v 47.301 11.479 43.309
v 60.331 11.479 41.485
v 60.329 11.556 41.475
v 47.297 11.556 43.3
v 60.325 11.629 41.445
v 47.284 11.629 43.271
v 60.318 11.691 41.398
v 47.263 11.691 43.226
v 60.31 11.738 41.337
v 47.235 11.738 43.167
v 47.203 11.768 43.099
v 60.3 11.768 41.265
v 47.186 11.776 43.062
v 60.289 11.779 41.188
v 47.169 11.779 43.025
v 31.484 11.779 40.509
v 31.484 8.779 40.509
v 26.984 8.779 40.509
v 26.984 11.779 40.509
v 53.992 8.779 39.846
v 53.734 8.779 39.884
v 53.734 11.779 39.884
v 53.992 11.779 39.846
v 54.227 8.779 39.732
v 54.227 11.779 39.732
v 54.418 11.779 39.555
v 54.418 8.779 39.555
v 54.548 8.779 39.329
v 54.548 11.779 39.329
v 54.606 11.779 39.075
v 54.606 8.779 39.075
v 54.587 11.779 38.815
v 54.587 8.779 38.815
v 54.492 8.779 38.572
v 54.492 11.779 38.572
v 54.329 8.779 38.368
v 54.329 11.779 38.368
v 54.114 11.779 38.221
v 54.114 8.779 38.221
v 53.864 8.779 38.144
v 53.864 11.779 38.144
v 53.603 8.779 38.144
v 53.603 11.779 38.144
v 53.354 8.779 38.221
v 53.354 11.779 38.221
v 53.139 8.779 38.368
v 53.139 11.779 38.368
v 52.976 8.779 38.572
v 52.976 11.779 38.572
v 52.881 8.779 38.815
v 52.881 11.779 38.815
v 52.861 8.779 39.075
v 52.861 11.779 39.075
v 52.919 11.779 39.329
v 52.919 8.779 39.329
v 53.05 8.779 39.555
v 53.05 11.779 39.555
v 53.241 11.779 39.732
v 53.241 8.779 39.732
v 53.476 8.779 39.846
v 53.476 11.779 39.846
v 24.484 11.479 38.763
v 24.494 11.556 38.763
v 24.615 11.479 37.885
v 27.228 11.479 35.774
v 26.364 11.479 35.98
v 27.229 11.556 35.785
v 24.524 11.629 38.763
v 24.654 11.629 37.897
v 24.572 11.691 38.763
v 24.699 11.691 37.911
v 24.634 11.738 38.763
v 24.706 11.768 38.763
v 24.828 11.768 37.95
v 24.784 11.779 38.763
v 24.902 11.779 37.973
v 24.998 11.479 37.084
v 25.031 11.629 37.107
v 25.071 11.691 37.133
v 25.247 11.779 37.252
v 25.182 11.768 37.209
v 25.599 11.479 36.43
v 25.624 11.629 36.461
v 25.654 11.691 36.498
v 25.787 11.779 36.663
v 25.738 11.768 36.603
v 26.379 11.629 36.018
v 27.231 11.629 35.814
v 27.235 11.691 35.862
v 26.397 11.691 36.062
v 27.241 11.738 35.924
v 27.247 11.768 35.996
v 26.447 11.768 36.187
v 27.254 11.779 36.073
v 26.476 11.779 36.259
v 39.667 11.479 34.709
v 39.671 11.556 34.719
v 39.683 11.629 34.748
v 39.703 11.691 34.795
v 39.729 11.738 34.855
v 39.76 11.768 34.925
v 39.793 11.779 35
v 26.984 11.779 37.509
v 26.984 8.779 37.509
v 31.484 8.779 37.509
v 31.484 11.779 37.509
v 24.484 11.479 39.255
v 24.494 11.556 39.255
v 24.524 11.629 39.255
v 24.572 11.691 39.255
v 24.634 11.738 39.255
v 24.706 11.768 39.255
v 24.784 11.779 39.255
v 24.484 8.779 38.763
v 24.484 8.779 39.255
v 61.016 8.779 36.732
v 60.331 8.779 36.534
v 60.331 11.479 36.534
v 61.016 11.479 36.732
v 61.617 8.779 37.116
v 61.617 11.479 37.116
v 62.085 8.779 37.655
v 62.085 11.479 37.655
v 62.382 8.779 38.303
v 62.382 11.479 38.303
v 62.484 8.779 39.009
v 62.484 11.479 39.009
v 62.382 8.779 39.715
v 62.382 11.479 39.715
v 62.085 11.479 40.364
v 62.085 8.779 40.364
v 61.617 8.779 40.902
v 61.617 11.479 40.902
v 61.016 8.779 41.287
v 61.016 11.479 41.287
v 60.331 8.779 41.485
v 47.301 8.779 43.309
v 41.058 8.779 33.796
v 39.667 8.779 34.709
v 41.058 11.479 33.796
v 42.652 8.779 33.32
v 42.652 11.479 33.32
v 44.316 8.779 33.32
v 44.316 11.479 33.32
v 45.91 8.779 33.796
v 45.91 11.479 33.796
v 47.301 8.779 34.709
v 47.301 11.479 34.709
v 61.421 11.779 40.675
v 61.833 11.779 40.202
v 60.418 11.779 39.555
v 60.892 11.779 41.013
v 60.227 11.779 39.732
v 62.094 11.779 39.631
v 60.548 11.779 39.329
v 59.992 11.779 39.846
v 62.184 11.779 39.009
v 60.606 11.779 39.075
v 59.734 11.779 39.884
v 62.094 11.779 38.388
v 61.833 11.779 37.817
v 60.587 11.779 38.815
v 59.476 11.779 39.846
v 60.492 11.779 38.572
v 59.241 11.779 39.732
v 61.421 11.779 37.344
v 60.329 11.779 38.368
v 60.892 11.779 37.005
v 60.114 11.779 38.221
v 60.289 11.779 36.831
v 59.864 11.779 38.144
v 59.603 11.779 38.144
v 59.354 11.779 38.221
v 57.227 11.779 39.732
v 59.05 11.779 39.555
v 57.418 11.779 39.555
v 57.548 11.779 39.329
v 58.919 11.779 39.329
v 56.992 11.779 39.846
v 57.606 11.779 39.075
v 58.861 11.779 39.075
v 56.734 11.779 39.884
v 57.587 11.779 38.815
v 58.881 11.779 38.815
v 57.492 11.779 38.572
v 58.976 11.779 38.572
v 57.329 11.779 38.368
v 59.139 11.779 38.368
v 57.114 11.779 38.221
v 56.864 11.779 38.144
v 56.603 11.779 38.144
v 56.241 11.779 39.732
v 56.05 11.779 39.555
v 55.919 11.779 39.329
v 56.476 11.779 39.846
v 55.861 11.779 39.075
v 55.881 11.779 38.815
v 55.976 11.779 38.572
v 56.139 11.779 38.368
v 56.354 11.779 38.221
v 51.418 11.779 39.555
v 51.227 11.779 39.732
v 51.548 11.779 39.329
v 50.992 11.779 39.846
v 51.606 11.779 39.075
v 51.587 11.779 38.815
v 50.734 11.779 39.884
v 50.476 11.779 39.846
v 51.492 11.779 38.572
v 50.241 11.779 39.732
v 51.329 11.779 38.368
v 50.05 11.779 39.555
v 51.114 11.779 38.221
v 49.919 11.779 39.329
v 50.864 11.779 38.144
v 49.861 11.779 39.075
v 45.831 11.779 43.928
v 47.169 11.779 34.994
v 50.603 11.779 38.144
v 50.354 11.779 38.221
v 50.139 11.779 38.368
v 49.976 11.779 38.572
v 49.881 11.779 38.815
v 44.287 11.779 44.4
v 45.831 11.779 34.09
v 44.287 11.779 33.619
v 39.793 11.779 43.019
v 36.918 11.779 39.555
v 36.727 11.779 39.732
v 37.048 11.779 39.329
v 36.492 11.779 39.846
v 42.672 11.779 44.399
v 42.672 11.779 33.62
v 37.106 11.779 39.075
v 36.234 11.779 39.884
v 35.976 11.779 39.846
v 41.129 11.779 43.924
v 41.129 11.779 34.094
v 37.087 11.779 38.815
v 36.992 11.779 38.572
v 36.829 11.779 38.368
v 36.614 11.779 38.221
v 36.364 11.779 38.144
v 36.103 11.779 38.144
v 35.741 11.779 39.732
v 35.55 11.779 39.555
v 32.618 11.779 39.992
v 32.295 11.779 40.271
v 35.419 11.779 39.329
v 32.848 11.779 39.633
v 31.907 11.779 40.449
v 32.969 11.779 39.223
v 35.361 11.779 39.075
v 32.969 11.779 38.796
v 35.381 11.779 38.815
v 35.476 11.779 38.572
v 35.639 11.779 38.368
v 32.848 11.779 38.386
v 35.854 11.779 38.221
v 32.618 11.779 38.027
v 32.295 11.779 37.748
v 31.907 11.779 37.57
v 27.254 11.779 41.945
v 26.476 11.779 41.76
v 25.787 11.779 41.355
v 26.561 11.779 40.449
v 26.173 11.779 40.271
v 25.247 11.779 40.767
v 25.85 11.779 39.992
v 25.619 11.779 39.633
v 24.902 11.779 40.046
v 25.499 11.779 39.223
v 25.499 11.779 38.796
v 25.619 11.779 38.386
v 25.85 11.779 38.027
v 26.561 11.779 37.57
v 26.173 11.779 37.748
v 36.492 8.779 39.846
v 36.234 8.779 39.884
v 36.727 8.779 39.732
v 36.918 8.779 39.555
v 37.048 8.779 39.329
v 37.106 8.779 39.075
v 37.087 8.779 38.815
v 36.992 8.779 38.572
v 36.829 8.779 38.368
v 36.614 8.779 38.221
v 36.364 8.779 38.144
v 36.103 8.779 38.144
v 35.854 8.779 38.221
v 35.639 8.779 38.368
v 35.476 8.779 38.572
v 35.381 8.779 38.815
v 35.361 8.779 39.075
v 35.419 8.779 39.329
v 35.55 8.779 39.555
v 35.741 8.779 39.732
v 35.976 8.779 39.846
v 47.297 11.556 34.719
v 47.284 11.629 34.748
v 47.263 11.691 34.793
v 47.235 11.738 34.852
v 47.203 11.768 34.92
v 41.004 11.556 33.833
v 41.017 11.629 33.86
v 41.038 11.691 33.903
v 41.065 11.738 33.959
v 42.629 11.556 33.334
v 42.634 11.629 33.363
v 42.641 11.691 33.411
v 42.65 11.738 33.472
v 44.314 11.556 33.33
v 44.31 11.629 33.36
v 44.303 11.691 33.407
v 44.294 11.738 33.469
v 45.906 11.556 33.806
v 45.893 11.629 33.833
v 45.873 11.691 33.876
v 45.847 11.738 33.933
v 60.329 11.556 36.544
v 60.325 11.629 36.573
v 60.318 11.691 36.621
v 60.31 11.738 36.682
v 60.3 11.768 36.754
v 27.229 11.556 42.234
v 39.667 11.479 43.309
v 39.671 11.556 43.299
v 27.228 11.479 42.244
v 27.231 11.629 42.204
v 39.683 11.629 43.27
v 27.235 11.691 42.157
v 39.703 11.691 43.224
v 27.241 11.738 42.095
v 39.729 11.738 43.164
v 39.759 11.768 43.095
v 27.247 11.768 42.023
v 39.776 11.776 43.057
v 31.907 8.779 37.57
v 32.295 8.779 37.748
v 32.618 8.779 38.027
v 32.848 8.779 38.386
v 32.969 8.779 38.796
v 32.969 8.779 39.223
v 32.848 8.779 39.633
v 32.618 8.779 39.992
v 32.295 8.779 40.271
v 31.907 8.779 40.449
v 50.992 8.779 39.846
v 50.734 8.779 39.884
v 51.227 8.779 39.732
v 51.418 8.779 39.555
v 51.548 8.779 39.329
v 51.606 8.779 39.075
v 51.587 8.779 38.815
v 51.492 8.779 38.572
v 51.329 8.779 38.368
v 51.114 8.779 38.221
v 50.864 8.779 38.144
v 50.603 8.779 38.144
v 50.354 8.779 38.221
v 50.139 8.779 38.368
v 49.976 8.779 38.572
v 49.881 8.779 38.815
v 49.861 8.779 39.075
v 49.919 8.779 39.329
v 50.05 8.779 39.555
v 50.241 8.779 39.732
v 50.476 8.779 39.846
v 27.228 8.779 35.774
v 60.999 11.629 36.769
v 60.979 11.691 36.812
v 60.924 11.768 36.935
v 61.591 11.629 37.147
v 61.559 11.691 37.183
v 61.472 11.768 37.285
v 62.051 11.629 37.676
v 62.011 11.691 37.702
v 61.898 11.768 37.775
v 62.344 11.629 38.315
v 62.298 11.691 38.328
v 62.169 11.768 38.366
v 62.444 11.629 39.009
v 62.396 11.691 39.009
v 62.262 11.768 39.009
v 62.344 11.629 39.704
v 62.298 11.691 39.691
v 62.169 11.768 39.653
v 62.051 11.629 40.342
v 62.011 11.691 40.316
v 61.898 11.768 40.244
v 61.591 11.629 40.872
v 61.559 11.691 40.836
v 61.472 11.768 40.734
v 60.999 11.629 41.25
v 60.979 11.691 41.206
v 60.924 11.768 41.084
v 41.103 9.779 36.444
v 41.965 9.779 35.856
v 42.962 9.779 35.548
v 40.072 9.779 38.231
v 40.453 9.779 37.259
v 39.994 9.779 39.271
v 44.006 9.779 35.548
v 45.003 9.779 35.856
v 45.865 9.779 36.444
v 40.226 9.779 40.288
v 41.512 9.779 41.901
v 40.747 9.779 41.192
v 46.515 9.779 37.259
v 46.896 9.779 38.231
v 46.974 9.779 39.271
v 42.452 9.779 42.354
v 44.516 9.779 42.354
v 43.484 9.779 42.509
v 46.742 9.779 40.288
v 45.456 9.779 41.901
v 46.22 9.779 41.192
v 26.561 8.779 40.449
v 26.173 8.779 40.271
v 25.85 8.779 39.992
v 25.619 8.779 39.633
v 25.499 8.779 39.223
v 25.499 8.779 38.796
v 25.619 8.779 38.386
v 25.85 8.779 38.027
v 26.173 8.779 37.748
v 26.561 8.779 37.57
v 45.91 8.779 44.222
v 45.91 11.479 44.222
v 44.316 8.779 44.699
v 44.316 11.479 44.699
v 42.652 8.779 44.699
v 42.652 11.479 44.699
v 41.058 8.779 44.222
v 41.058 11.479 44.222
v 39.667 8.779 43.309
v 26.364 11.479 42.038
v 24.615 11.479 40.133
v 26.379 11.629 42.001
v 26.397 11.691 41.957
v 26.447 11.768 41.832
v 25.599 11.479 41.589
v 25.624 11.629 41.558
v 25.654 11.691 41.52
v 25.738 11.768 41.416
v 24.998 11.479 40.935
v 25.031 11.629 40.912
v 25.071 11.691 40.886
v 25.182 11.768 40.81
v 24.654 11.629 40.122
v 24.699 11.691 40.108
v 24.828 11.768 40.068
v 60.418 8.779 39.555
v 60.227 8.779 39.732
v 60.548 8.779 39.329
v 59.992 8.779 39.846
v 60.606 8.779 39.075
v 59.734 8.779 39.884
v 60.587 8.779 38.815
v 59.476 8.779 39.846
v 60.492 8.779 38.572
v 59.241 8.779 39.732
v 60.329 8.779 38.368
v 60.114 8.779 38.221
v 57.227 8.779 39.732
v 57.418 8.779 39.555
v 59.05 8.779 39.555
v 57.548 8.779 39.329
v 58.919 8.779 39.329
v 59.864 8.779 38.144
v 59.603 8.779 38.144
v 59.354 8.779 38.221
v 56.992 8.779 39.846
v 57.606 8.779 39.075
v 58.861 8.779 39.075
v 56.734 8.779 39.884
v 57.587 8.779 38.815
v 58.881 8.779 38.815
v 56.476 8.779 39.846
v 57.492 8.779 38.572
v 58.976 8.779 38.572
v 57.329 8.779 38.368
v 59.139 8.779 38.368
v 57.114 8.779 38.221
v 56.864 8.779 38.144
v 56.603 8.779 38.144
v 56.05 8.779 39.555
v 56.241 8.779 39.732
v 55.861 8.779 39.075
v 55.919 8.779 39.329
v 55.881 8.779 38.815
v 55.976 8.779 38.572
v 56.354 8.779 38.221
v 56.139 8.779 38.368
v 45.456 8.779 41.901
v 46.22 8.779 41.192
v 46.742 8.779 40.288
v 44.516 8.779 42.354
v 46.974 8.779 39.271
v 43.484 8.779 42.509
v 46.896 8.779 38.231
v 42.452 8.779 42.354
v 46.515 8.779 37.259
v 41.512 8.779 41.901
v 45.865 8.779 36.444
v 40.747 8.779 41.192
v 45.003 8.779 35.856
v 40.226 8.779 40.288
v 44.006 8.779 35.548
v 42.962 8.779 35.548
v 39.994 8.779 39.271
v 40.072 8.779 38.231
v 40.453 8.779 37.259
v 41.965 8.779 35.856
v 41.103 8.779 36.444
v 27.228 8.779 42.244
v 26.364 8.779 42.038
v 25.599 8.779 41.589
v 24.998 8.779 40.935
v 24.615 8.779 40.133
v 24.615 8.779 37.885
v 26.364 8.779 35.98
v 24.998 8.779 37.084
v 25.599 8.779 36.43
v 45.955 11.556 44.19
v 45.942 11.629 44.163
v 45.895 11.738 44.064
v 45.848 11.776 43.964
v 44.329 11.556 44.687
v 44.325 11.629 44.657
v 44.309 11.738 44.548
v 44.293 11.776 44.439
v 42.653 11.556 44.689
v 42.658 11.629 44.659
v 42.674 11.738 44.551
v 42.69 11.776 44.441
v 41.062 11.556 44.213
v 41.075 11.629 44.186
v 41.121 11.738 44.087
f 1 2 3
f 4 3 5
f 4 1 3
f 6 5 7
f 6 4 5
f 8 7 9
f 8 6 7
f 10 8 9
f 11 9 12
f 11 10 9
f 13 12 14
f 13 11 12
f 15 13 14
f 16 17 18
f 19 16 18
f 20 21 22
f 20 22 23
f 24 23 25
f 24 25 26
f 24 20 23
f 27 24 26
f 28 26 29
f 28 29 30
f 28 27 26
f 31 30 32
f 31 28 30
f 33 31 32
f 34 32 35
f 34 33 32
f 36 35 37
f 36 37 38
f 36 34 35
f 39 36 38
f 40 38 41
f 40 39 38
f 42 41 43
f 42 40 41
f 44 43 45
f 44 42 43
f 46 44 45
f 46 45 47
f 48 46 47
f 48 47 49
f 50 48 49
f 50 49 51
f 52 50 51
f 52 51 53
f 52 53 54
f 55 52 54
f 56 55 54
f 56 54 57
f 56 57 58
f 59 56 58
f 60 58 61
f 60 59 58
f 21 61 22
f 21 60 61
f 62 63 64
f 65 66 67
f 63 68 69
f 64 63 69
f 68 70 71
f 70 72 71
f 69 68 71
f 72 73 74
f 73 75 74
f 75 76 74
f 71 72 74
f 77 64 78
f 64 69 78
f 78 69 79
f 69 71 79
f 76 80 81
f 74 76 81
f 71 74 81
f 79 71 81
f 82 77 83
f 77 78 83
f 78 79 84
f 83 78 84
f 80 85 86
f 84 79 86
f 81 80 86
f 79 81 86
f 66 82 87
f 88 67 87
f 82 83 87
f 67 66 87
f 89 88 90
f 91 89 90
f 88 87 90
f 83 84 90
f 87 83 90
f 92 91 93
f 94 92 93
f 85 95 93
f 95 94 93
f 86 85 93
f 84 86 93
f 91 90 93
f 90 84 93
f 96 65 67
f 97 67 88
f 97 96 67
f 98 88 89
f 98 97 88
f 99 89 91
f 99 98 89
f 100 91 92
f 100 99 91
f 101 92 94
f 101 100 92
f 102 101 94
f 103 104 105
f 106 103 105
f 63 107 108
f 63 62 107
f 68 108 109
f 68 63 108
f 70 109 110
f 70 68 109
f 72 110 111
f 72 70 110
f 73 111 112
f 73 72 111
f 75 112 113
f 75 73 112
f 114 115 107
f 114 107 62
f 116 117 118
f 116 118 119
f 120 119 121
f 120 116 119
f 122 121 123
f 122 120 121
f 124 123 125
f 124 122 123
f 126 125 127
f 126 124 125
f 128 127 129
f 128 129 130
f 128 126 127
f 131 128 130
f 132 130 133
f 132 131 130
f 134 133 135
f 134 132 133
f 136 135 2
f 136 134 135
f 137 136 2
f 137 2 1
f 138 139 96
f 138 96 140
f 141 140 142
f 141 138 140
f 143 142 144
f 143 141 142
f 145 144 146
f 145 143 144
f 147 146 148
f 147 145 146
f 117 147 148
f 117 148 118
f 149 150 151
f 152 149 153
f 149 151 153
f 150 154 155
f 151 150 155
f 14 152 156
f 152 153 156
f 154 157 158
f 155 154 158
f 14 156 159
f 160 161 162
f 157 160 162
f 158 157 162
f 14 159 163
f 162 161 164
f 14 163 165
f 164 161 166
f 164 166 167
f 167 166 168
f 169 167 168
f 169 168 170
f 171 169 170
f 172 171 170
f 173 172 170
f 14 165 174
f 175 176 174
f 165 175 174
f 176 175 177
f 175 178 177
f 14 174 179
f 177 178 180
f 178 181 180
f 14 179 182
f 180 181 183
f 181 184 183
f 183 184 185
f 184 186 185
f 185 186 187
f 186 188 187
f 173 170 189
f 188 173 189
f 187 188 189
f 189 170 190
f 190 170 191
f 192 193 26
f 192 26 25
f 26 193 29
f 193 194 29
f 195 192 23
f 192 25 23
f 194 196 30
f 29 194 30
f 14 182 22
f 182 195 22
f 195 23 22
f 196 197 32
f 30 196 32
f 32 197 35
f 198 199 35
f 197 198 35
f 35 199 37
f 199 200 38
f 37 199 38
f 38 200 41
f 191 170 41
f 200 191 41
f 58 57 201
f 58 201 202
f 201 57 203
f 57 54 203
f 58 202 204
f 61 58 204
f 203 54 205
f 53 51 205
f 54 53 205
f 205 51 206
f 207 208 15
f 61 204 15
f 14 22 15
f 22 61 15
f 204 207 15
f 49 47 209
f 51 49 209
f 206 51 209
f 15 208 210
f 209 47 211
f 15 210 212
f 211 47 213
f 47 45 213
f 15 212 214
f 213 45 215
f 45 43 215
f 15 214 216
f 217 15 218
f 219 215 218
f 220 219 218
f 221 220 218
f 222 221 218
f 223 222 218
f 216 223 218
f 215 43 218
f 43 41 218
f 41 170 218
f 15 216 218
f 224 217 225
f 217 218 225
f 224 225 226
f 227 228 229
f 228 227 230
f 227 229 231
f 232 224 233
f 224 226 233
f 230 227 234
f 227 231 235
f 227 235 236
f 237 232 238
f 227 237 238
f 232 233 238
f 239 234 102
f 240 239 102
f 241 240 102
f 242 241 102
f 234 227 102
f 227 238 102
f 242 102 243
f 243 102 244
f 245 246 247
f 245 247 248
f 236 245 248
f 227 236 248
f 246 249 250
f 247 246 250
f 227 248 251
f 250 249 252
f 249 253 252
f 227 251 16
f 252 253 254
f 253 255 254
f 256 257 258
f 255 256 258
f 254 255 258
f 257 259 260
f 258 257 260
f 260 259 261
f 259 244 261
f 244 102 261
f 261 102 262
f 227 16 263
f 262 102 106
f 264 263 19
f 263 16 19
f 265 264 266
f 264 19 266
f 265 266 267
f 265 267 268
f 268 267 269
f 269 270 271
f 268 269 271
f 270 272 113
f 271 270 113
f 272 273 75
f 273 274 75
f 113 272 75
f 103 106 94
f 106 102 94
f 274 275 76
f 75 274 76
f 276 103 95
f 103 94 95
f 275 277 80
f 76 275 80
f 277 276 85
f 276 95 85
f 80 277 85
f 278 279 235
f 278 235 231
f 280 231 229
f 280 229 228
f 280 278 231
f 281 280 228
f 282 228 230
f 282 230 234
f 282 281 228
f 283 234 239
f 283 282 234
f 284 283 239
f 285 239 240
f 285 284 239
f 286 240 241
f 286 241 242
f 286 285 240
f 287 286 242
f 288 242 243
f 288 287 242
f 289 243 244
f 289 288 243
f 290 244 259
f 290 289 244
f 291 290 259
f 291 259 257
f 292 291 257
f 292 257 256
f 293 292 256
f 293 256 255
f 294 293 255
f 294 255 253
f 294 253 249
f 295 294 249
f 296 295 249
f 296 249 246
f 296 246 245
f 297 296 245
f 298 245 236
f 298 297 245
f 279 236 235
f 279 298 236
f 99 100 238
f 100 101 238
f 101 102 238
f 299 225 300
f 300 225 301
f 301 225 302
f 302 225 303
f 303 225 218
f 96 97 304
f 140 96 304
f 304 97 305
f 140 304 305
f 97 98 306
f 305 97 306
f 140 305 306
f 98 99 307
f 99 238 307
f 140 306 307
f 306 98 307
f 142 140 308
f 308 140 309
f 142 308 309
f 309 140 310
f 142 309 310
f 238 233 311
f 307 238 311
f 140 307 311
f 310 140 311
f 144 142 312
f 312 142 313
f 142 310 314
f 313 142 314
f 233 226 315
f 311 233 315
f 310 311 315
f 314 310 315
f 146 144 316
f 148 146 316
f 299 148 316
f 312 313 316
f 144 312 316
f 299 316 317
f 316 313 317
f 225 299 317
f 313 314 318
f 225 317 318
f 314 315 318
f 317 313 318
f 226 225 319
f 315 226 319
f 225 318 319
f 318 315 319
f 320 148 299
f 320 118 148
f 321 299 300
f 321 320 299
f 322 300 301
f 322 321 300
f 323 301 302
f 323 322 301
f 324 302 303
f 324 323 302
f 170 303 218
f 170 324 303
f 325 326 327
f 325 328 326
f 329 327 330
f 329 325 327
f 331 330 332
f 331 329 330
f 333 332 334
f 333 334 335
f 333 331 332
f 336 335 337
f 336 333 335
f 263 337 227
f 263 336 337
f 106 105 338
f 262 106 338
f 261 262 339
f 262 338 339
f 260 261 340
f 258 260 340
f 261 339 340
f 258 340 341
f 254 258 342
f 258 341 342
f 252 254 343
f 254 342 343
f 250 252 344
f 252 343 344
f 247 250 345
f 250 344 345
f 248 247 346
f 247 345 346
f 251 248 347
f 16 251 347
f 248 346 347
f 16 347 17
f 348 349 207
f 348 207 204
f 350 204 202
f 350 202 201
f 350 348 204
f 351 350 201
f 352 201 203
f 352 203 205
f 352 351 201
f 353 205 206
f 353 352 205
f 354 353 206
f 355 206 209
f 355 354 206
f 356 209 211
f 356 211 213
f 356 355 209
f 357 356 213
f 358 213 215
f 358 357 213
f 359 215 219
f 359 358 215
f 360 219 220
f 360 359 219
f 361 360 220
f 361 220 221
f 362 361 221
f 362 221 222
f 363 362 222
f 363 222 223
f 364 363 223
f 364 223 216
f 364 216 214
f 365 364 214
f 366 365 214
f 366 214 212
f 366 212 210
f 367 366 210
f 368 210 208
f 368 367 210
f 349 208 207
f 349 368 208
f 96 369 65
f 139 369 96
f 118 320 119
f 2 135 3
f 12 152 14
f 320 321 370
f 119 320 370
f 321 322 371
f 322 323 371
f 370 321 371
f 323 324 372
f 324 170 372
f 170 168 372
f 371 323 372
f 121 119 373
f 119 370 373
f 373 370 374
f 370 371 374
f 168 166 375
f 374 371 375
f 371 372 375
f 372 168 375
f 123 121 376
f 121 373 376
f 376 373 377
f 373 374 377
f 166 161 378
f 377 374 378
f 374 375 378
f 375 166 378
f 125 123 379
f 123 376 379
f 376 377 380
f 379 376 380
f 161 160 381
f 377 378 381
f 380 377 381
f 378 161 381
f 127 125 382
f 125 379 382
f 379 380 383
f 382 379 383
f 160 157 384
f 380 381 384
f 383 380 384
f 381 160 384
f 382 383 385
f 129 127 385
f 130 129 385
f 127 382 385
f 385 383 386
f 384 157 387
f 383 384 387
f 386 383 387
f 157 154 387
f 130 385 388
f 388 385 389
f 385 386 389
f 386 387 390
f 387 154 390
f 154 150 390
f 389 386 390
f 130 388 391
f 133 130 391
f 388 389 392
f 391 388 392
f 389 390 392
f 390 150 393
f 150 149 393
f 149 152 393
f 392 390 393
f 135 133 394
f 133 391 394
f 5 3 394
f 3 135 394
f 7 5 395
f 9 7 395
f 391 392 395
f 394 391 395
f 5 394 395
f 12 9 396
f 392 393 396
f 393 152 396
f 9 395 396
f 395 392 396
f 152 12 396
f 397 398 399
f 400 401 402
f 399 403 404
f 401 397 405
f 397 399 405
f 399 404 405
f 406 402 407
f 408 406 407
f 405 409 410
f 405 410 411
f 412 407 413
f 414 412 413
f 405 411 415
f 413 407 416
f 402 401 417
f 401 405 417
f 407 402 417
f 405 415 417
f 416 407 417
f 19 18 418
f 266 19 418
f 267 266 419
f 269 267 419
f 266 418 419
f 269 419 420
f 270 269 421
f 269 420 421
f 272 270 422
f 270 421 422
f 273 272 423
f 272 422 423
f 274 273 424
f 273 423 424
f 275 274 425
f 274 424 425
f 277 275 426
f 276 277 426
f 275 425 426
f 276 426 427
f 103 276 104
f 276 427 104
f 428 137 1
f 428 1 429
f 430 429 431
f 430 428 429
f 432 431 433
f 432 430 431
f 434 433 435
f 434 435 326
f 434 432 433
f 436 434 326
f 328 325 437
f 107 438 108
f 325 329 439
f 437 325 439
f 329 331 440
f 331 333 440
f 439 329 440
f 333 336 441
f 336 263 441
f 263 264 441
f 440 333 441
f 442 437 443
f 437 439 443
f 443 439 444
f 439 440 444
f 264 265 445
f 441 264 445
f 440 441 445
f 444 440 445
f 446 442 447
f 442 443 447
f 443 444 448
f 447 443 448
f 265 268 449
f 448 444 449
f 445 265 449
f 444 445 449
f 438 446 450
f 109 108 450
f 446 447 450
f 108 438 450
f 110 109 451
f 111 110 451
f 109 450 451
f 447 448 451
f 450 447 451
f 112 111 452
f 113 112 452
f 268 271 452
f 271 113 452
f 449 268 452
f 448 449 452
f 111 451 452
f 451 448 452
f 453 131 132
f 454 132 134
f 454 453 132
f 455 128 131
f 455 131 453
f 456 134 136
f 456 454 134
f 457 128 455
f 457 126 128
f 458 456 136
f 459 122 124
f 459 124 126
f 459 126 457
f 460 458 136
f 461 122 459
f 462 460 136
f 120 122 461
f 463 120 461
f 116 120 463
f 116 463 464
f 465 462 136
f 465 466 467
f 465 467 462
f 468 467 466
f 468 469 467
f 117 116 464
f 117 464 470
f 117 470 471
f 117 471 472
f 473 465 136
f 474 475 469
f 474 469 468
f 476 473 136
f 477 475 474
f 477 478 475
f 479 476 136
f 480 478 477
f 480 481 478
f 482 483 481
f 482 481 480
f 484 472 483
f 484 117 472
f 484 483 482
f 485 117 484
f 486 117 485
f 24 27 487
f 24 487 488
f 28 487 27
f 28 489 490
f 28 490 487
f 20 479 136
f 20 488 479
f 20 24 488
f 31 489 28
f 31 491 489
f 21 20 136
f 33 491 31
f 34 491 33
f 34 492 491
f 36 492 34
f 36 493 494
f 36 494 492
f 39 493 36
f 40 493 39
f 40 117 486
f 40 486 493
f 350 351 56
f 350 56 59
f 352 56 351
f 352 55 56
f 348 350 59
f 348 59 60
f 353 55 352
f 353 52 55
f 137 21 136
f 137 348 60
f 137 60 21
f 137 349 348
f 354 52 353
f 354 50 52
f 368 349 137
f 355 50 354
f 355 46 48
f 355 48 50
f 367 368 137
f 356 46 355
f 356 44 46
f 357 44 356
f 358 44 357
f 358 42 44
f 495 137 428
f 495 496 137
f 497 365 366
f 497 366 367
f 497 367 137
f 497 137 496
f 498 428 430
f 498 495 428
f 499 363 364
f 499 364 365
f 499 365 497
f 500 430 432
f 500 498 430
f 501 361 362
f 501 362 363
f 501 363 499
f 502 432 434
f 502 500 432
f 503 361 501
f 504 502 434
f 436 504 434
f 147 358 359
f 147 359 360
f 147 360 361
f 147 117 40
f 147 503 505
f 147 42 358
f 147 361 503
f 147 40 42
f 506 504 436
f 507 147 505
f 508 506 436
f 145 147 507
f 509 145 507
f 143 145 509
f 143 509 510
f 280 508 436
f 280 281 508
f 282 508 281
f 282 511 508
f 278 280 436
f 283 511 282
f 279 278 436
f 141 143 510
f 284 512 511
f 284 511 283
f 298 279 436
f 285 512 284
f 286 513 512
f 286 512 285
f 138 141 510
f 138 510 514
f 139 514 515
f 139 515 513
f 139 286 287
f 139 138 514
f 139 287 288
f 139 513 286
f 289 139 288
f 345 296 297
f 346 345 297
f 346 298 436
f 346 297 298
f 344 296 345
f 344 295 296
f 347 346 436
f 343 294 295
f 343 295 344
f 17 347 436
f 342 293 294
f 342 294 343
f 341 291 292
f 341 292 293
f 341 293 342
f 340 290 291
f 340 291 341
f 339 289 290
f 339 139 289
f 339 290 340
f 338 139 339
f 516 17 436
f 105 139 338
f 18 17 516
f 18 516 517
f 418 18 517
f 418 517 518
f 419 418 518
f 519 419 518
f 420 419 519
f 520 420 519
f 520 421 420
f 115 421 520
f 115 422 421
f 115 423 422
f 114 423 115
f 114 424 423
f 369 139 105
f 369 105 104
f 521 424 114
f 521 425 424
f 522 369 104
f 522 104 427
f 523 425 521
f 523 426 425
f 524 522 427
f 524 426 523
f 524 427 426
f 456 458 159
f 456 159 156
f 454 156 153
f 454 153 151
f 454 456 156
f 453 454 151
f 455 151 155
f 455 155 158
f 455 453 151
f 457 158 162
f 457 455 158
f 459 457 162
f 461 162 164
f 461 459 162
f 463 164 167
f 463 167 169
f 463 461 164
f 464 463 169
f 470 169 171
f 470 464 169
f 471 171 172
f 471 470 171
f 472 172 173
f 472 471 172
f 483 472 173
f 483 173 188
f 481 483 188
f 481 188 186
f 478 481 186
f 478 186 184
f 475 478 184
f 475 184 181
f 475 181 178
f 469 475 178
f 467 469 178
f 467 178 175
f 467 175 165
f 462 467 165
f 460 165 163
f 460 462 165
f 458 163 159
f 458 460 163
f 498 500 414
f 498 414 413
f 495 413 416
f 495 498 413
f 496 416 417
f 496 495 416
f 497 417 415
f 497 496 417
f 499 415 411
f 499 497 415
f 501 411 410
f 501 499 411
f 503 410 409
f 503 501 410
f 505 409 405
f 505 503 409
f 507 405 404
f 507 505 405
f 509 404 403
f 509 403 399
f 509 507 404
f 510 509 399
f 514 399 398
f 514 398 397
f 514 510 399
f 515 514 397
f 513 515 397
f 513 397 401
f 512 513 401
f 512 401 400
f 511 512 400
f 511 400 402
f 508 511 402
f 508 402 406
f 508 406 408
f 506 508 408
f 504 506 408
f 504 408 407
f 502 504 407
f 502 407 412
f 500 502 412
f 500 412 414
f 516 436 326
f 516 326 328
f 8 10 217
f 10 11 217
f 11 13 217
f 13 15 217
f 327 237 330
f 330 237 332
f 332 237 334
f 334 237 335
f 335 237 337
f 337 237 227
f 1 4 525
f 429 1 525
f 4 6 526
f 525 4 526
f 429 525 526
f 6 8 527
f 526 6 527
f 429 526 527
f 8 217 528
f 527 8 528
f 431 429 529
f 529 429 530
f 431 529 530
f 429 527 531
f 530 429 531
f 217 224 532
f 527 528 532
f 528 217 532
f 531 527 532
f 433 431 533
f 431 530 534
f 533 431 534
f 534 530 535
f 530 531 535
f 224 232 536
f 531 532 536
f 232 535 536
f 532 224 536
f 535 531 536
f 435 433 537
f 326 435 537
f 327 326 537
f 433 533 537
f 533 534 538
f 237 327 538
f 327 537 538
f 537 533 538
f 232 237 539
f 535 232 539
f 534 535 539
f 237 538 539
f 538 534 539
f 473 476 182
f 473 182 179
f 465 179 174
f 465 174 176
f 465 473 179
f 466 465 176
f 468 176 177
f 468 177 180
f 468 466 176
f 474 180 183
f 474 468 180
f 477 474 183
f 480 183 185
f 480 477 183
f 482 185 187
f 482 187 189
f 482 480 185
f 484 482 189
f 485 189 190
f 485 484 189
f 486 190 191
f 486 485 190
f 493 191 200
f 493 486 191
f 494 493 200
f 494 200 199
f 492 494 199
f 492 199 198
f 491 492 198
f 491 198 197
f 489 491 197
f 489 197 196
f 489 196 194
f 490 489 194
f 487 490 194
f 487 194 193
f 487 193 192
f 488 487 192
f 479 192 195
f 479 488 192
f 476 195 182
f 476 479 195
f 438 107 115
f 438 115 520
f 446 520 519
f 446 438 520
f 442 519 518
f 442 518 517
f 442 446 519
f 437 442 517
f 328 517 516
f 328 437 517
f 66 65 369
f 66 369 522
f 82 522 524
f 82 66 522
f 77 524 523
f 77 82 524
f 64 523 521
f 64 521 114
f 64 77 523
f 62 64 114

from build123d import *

# Parameters (mm, degrees)
SKETCH1_R           = 0.875
SKETCH1_R_2         = 3.5
BOSS_EXTRUDE1_DEPTH = 3
BOSS_EXTRUDE2_START = -2
SKETCH2_R           = 3.5
BOSS_EXTRUDE2_DEPTH = 2
FILLET1_R           = 3
FILLET2_R           = 0.3


with BuildPart() as part:
    # Sketch1 → Boss-Extrude1 (new body)
    with BuildSketch(Plane(origin=(0, 8.778505218, 0), x_dir=(1, 0, 0), z_dir=(0, 1, 0))):
        with BuildLine():
            Line((24.483909442, -36.009383283), (39.666515042, -34.709383283))
            ThreePointArc((39.666515042, -34.709383283), (43.483909442, -33.259383283), (47.301303841, -34.709383283))
            Line((47.301303841, -34.709383283), (60.330539136, -36.533530328))
            ThreePointArc((60.330539136, -36.533530328), (62.483909442, -39.009383283), (60.330539136, -41.485236238))
            Line((60.330539136, -41.485236238), (47.301303841, -43.309383283))
            ThreePointArc((47.301303841, -43.309383283), (43.483909442, -44.759383283), (39.666515042, -43.309383283))
            Line((39.666515042, -43.309383283), (24.483909442, -42.009383283))
            Line((24.483909442, -42.009383283), (24.483909442, -36.009383283))
        make_face()
        with Locations(Location((36.233909442, -39.009383283, 0), (0, 0, 270))):
            Circle(SKETCH1_R, mode=Mode.SUBTRACT)
        with Locations(Location((50.733909442, -39.009383283, 0), (0, 0, 270))):
            Circle(SKETCH1_R, mode=Mode.SUBTRACT)
        with Locations(Location((53.733909442, -39.009383283, 0), (0, 0, 270))):
            Circle(SKETCH1_R, mode=Mode.SUBTRACT)
        with Locations(Location((56.733909442, -39.009383283, 0), (0, 0, 270))):
            Circle(SKETCH1_R, mode=Mode.SUBTRACT)
        with Locations(Location((59.733909442, -39.009383283, 0), (0, 0, 270))):
            Circle(SKETCH1_R, mode=Mode.SUBTRACT)
        with Locations(Location((43.483909442, -39.009383283, 0), (0, 0, 270))):
            Circle(SKETCH1_R_2, mode=Mode.SUBTRACT)
        with BuildLine():
            Line((26.983909442, -37.509383283), (31.483909442, -37.509383283))
            ThreePointArc((31.483909442, -37.509383283), (32.983909442, -39.009383283), (31.483909442, -40.509383283))
            Line((31.483909442, -40.509383283), (26.983909442, -40.509383283))
            ThreePointArc((26.983909442, -40.509383283), (25.483909442, -39.009383283), (26.983909442, -37.509383283))
        make_face(mode=Mode.SUBTRACT)
    extrude(amount=BOSS_EXTRUDE1_DEPTH)

    # Sketch2 → Boss-Extrude2 (add)
    with BuildSketch(Plane(origin=(0, 11.778505218, 0), x_dir=(1, 0, 0), z_dir=(0, 1, 0)).offset(BOSS_EXTRUDE2_START)):
        with Locations(Location((43.483909442, -39.009383283, 0), (0, 0, 270))):
            Circle(SKETCH2_R)
    extrude(amount=BOSS_EXTRUDE2_DEPTH)

    # Fillet1
    fillet1_edges = [part.edges().sort_by_distance(p)[0] for p in [
        (24.483909442, 10.278505218, 42.009383283),
        (24.483909442, 10.278505218, 36.009383283),
    ]]
    fillet(fillet1_edges, radius=FILLET1_R)

    # Fillet2
    fillet2_edges = [part.edges().sort_by_distance(p)[0] for p in [
        (43.483909442, 11.778505218, 44.759383283),
        (53.815921489, 11.778505218, 42.39730976),
        (62.483909442, 11.778505218, 39.009383283),
        (53.815921489, 11.778505218, 35.621456805),
        (43.483909442, 11.778505218, 33.259383283),
        (33.447244034, 11.778505218, 42.776862547),
        (24.483909442, 11.778505218, 39.009383283),
        (33.447244034, 11.778505218, 35.241904019),
        (25.273953645, 11.778505218, 36.734671327),
        (25.273953645, 11.778505218, 41.284095239),
    ]]
    fillet(fillet2_edges, radius=FILLET2_R)


solid = part.part
